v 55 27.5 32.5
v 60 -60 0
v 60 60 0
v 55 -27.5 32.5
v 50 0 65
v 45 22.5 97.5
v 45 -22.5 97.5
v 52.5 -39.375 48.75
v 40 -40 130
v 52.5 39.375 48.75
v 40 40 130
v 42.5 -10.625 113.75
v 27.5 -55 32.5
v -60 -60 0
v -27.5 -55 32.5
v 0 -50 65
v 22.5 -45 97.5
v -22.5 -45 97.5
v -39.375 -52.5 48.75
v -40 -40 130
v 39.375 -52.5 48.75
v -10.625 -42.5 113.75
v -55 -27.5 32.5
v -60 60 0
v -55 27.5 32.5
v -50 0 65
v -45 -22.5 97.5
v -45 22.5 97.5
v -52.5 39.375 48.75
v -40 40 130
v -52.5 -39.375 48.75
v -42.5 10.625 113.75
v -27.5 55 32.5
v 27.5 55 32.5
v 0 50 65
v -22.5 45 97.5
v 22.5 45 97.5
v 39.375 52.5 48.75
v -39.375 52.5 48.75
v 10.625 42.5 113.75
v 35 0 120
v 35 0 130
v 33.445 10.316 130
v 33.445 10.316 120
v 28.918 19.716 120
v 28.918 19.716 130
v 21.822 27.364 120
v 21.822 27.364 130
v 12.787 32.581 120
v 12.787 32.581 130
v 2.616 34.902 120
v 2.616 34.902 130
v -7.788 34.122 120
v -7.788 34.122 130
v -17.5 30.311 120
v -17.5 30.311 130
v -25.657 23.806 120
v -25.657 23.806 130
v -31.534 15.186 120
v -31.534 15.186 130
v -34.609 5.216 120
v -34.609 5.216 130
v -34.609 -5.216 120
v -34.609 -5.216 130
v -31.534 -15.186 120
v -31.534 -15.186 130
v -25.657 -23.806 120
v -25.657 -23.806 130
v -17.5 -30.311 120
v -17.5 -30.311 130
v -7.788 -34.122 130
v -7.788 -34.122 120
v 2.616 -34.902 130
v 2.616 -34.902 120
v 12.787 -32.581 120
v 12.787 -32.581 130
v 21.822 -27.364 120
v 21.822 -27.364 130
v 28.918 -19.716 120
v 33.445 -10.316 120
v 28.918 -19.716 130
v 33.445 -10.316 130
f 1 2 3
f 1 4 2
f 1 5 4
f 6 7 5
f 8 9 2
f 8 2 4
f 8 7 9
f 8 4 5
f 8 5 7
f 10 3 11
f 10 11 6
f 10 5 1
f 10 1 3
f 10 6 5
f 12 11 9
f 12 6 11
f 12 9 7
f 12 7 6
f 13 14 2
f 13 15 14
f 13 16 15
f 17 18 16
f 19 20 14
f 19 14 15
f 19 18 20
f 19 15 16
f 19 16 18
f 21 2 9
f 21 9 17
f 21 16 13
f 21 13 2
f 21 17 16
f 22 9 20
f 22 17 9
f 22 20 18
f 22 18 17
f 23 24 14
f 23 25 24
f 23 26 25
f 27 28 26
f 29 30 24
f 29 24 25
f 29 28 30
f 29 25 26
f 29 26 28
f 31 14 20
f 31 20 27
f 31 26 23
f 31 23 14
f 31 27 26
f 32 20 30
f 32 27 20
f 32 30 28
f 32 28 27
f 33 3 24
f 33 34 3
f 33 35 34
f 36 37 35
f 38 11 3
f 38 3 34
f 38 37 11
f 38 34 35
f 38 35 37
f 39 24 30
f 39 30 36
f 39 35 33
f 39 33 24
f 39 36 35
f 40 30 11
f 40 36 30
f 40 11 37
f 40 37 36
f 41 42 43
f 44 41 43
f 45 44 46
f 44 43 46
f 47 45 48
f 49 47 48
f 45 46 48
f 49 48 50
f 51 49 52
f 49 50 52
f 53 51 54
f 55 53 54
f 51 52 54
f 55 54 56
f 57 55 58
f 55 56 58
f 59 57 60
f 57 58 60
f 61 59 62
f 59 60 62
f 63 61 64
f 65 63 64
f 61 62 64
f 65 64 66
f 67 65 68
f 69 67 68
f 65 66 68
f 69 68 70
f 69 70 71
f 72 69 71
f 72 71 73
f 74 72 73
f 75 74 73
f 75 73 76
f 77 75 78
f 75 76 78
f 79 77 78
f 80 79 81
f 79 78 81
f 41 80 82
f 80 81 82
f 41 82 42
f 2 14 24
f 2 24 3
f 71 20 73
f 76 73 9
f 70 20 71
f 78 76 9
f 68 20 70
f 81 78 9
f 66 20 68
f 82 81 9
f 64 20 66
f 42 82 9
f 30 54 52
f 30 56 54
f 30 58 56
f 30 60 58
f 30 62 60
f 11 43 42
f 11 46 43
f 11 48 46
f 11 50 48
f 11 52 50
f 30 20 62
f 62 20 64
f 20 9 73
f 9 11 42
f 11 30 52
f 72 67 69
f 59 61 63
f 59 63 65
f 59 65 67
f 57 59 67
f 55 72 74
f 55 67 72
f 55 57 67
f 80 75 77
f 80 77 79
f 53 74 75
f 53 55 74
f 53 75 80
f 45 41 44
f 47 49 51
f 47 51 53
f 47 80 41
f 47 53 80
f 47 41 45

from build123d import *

# Parameters (mm, degrees)
F0_W     = 120
F0_H     = 120
F2_W     = 80
F2_H     = 80
F4_R     = 35
F5_DEPTH = 10


with BuildPart() as f3:
    # F0 (on Top) → F3 section 0
    with BuildSketch(Plane.XY):
        Rectangle(F0_W, F0_H)
    # F2 (on offset) → F3 section 1
    with BuildSketch(Plane.XY.offset(130)):
        Rectangle(F2_W, F2_H)
    loft()

    # F4 (on face) → F5 (cut)
    with BuildSketch(Plane.XY.offset(130)):
        Circle(F4_R)
    extrude(amount=-F5_DEPTH, mode=Mode.SUBTRACT)


solid = f3.part
